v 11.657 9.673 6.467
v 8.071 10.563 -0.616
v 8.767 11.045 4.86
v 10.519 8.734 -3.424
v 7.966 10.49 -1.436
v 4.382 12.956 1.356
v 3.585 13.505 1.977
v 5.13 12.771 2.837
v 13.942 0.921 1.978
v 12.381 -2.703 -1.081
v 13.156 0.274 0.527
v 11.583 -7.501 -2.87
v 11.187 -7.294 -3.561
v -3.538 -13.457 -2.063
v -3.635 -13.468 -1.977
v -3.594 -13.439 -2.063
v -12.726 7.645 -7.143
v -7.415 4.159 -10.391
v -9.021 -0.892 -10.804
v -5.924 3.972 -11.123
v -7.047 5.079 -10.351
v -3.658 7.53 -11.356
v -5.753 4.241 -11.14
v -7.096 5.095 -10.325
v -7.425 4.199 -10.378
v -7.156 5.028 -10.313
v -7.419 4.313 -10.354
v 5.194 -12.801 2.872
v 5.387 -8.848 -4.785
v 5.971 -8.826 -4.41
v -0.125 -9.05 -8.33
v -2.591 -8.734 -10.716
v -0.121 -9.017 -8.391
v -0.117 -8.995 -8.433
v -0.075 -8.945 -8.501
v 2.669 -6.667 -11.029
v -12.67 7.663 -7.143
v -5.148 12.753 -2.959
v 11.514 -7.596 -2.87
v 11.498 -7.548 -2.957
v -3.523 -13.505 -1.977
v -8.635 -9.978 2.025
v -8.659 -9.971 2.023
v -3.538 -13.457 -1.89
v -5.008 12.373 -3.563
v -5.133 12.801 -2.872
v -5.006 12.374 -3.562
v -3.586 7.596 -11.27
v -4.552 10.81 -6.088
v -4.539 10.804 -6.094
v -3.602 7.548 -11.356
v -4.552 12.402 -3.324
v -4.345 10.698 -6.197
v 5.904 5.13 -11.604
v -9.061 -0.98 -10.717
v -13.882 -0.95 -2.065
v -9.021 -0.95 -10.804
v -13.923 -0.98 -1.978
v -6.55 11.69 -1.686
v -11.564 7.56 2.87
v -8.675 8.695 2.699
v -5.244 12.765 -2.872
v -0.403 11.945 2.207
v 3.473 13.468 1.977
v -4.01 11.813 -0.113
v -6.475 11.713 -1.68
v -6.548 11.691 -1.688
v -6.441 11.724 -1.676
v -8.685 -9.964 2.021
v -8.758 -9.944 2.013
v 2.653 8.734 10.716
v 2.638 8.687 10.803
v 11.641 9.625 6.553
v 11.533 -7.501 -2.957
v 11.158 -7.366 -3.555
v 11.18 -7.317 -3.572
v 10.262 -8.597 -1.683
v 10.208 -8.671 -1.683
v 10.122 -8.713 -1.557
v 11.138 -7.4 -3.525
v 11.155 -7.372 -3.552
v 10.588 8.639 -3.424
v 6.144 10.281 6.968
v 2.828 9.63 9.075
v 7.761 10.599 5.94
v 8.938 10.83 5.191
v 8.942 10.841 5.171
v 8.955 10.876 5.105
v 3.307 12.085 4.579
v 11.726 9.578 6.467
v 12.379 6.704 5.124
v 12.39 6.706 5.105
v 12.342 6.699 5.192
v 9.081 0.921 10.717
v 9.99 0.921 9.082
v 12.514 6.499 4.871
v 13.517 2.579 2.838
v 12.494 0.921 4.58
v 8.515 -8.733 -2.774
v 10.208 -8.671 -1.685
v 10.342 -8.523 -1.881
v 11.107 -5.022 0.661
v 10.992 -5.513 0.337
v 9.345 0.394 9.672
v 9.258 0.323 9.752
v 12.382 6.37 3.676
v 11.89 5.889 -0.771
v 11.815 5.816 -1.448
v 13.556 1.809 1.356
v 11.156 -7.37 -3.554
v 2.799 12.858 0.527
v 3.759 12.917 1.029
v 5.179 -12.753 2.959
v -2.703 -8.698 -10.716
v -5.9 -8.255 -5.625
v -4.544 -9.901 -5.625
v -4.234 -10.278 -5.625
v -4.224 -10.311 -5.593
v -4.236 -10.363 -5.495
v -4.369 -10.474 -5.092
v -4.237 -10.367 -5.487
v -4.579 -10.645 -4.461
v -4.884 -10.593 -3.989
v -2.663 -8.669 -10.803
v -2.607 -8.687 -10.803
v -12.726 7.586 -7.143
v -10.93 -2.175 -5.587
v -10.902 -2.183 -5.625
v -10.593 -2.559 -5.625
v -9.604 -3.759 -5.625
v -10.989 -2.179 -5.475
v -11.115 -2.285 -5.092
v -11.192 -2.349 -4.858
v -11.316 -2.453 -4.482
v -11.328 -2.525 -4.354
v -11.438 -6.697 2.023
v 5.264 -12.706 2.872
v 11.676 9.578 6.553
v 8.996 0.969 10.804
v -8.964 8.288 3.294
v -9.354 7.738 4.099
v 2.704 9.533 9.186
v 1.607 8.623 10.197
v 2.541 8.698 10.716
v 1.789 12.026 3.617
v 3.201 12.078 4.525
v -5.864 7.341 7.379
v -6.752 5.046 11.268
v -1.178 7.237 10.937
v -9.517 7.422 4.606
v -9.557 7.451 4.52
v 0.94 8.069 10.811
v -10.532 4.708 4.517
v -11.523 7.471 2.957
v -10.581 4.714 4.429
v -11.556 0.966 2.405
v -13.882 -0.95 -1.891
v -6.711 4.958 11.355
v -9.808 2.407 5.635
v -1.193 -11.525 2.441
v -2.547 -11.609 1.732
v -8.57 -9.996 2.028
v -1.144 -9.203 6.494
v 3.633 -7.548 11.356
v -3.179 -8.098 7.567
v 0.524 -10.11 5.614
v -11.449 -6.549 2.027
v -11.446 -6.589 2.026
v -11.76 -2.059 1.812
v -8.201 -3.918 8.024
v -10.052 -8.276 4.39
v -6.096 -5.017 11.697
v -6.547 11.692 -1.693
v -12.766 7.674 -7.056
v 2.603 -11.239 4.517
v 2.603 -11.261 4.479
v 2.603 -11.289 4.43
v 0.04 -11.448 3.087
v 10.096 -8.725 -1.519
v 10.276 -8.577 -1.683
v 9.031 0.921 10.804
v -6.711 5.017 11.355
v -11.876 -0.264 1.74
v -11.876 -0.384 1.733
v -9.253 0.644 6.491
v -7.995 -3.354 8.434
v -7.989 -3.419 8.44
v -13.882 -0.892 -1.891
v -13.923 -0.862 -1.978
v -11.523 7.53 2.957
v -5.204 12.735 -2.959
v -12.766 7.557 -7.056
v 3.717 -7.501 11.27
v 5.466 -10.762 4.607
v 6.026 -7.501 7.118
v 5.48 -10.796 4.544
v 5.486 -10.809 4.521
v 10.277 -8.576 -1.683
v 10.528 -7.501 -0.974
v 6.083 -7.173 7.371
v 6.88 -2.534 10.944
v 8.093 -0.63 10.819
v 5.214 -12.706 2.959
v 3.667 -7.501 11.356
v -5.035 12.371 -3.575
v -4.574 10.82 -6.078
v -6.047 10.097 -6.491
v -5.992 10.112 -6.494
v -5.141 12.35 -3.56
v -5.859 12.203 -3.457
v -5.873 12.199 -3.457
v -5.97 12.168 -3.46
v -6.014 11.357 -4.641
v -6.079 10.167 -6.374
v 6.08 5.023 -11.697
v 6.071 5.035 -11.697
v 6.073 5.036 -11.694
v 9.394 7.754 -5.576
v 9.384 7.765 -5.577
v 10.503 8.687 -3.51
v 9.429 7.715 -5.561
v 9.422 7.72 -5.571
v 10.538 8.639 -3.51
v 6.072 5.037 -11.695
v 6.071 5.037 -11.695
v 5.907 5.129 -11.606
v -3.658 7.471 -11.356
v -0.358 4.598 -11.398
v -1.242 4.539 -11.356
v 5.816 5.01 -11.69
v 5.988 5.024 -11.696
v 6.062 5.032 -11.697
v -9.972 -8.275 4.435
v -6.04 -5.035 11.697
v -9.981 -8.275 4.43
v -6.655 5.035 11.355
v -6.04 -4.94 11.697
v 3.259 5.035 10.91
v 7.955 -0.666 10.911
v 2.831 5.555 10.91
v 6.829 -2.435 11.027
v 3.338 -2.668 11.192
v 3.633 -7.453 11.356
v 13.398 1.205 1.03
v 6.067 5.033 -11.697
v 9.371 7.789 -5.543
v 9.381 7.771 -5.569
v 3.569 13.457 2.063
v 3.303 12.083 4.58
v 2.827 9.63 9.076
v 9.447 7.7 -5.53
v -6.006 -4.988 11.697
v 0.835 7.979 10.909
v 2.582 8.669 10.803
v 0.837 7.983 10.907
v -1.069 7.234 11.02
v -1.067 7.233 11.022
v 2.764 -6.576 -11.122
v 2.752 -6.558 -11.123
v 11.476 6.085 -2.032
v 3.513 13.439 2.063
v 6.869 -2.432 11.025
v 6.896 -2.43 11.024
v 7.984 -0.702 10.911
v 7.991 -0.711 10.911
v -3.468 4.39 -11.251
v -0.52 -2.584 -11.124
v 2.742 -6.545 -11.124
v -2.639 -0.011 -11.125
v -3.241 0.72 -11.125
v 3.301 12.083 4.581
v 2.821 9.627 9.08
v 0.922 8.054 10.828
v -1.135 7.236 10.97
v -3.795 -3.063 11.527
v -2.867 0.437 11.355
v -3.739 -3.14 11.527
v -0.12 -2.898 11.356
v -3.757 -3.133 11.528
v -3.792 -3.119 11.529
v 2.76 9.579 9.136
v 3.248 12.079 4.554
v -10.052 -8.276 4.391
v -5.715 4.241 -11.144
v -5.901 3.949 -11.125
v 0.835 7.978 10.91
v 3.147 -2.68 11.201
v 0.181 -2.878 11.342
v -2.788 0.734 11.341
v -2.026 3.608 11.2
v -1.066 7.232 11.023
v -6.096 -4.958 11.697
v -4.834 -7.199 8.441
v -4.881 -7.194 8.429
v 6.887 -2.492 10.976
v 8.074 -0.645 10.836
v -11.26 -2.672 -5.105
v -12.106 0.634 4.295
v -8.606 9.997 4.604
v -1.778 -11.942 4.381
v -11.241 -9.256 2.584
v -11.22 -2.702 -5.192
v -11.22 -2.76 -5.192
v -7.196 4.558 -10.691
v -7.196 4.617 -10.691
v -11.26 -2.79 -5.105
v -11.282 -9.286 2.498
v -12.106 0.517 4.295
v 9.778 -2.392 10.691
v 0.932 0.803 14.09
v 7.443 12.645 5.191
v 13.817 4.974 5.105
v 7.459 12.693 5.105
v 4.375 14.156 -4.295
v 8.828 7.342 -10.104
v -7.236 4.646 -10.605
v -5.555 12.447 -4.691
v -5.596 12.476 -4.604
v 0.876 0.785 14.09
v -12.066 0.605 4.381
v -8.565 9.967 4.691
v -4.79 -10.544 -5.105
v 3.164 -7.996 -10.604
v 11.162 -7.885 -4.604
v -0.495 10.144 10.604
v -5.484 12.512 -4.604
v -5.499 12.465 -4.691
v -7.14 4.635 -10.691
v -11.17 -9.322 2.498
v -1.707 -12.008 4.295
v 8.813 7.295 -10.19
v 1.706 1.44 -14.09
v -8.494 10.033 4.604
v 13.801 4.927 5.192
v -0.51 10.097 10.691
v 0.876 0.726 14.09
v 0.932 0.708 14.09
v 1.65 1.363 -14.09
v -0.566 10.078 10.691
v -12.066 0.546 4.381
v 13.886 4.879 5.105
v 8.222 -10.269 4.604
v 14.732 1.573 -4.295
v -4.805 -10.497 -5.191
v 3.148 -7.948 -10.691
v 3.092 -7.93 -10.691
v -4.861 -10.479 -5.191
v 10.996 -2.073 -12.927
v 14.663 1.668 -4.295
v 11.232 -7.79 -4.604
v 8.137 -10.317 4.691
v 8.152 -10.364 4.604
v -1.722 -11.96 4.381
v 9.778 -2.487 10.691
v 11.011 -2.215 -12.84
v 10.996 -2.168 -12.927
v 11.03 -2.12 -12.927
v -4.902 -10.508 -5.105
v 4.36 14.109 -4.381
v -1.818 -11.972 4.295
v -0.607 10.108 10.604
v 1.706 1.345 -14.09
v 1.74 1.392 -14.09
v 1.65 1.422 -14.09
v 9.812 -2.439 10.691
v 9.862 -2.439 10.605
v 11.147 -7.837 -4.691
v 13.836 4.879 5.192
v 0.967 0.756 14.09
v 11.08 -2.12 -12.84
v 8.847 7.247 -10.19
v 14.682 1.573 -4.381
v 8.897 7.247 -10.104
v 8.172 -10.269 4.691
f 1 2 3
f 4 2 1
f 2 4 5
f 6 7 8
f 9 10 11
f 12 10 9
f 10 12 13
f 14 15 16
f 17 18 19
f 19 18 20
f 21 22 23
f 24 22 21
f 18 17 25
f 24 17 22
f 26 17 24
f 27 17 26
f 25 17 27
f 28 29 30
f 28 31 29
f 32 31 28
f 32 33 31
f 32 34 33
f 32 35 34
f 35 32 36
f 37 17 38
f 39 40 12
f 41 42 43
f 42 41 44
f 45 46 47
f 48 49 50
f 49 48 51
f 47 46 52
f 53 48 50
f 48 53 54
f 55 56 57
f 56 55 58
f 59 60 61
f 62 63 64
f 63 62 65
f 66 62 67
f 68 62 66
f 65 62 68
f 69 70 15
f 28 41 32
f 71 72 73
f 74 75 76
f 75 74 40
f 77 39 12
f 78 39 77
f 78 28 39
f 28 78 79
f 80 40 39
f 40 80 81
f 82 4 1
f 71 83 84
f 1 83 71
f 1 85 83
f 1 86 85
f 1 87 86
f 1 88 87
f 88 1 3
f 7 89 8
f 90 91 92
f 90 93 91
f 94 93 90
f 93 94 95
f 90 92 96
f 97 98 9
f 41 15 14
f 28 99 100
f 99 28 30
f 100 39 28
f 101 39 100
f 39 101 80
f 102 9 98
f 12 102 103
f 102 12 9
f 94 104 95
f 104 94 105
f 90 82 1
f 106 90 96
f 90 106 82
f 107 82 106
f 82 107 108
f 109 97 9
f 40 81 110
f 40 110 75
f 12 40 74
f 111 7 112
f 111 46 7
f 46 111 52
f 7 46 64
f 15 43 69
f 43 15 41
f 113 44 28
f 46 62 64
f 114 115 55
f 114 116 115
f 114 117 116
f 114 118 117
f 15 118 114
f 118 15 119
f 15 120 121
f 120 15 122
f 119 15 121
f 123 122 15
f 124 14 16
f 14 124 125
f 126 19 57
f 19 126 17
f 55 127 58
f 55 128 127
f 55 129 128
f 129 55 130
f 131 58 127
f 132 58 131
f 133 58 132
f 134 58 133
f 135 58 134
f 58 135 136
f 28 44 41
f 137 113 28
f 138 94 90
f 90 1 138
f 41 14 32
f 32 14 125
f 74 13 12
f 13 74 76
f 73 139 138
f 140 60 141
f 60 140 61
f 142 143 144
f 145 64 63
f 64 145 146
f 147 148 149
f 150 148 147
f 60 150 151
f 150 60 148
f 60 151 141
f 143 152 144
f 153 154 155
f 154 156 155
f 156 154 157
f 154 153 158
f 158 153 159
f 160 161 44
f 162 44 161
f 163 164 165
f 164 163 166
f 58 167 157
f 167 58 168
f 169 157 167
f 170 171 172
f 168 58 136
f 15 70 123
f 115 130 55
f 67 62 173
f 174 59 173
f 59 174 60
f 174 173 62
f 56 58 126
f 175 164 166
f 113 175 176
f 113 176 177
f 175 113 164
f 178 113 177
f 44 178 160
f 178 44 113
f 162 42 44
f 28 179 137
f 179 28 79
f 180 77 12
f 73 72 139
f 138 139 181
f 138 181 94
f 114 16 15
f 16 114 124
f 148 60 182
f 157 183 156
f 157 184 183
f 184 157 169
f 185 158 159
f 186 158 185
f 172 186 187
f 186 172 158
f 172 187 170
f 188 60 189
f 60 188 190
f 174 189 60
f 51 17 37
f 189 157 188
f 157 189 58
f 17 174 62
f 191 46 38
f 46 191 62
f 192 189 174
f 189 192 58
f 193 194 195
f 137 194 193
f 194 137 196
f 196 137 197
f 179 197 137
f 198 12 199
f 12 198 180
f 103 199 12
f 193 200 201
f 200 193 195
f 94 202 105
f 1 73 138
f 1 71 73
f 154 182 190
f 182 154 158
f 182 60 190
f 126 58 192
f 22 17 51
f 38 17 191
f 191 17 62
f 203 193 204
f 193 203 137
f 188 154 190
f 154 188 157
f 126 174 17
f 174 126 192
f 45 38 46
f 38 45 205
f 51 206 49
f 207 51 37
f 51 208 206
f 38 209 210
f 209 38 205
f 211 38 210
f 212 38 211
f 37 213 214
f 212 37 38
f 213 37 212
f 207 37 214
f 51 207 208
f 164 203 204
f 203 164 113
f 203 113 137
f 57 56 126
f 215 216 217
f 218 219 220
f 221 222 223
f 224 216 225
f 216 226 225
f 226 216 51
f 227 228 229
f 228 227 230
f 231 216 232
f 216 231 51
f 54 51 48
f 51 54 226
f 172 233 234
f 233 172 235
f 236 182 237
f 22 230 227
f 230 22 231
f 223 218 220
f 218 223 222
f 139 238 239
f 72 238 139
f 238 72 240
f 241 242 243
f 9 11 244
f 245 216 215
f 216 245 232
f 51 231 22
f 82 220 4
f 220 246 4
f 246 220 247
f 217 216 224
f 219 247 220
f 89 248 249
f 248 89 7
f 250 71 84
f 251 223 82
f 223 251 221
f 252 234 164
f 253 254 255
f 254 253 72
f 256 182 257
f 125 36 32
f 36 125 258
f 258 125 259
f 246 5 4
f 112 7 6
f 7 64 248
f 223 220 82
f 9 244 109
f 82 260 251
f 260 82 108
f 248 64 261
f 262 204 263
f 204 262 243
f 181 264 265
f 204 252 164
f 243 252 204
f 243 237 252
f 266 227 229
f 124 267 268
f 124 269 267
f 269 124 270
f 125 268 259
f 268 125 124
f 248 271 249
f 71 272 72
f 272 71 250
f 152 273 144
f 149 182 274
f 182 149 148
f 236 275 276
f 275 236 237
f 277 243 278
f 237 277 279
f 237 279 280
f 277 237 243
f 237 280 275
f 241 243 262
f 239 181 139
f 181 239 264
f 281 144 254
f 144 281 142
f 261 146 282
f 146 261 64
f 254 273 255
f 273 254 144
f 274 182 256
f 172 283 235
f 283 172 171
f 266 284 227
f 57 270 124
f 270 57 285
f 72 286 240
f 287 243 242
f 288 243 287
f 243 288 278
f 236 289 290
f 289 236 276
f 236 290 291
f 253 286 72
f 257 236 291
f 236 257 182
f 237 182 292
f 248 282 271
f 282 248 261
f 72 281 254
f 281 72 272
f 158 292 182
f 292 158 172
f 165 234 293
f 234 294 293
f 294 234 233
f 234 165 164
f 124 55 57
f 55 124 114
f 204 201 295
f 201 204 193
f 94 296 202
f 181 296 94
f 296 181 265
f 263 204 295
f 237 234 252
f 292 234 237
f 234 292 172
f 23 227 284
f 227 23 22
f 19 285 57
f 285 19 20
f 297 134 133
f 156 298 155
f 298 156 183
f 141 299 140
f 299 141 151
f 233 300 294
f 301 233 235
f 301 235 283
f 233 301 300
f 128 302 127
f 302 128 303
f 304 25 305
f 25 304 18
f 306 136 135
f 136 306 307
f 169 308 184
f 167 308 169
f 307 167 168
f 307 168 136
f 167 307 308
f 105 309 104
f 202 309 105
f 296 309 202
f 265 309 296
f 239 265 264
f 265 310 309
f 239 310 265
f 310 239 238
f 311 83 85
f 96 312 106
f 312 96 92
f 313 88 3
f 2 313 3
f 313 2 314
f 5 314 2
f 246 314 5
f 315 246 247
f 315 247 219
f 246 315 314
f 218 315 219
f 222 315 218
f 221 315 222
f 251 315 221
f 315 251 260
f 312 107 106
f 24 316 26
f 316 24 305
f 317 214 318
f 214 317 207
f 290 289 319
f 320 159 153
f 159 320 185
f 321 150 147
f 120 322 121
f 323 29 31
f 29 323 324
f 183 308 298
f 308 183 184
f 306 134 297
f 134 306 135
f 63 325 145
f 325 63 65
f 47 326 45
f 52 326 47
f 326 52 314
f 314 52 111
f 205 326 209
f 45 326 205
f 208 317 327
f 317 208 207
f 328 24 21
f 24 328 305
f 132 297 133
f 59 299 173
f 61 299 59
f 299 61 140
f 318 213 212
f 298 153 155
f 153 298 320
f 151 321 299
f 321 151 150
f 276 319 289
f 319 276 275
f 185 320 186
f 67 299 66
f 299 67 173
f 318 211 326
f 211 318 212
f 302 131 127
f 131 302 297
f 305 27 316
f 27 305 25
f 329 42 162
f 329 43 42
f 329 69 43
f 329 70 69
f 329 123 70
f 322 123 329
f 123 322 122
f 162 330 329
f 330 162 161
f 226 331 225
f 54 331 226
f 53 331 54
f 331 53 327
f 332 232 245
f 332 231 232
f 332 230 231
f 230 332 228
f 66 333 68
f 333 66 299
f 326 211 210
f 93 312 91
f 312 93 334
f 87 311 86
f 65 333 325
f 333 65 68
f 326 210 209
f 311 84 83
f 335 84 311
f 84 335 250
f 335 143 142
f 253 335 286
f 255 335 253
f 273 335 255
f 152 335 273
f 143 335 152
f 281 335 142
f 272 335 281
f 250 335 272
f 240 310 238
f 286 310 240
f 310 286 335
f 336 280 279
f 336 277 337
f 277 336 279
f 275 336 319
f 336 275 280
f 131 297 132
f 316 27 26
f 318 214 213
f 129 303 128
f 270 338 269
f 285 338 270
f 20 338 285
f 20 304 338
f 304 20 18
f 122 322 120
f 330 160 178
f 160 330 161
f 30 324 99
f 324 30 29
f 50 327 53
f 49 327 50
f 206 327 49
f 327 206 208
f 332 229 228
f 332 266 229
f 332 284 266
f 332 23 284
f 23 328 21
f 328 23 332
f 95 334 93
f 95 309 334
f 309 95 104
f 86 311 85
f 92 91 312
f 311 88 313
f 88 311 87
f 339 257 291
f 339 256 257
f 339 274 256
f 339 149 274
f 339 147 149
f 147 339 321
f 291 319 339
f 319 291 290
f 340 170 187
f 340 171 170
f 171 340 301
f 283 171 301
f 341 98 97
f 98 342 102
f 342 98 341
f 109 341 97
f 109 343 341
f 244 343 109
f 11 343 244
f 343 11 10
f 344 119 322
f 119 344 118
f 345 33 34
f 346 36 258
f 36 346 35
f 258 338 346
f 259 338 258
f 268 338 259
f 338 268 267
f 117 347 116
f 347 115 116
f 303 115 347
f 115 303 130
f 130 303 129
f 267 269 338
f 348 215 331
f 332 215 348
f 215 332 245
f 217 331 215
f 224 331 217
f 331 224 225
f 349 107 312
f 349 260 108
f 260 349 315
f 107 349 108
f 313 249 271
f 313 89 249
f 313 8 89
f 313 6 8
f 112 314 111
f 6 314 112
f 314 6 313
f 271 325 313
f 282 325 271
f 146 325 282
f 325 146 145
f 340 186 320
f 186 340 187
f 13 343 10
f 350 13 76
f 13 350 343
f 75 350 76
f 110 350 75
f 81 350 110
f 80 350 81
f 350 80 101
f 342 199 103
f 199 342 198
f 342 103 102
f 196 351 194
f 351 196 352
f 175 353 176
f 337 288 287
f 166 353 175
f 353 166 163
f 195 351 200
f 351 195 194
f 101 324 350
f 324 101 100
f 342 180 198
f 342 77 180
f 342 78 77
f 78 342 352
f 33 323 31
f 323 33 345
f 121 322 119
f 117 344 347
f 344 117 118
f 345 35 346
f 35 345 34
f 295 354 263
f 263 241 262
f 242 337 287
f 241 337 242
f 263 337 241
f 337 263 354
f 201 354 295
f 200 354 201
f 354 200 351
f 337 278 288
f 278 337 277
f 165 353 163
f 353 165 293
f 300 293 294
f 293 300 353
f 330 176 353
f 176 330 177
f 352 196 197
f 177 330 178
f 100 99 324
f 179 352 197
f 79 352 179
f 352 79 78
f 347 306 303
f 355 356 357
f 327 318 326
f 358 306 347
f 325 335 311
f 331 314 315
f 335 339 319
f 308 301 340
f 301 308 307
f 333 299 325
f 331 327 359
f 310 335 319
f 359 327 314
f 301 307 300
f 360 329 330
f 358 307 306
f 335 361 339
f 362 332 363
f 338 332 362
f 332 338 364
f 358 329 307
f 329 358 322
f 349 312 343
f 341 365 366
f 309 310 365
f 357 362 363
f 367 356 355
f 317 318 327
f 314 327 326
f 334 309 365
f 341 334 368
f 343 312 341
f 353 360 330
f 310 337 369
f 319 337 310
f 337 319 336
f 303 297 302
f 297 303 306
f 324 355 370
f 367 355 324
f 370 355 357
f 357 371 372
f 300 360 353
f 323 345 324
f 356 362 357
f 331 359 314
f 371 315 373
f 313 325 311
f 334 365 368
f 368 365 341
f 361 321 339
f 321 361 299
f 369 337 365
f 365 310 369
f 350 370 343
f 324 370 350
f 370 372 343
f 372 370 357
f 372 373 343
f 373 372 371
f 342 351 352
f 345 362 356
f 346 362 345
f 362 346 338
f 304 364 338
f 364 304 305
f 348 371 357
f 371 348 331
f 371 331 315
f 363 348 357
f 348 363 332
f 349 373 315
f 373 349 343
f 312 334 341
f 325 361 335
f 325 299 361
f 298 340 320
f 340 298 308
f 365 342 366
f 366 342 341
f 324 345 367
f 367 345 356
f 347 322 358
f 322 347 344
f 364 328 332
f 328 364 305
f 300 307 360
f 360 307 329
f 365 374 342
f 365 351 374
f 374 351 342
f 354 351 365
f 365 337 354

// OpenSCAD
// Auto-generated OpenSCAD file

    inner_points = 10*[[-0.4820813211250987, -1.0449238650604131, -0.5104799034334353], [-0.052587296473702555, 1.0049095944004596, 1.060449642253799], [0.3132765628671369, -0.7900923074517557, -1.060449642253799], [0.7427705875185331, 1.259741152009117, 0.5104799034334353], [0.8121529711437319, -1.026904669604844, 0.4604304395233323], [0.9762050905955799, -0.24393795936757026, 1.060472132044425], [-0.7155158242021455, 0.4587552463162742, -1.060472132044425], [-0.5514637047502975, 1.241721956553548, -0.4604304395233323], [-0.6190335754244582, -0.5099059922176972, 1.010386278888689], [1.4632403980874105, 0.15725168700784506, -0.4294531901269253], [-1.2025511316939763, 0.05756559994085883, 0.4294531901269253], [0.8797228418178926, 0.7247232791664011, -1.010386278888689], [-0.1737587446246939, -1.191281953827171, 0.4294756799175514], [0.09168316057485429, 0.07558479539642826, 1.400363533083693], [1.1131573448949394, -0.7789558322102864, -0.4603940502776995], [1.3785992500944875, 0.487910917013313, 0.5104938028884421], [-1.1179099837010533, -0.27309363006460907, -0.5104938028884421], [-0.8524680785015052, 0.9937731191589904, 0.4603940502776995], [0.16900610581858003, 0.13923249155227563, -1.400363533083693], [0.43444801101812824, 1.406099240775875, -0.4294756799175514], [-1.1201047009544618, -0.9226987816684733, 0.249774787956858], [1.0980326190753988, -0.212010675559726, -1.284010728119616]];

    outer_points = 10*[[0.3553738060072703, 1.340954088422547, 0.19767924096673445], [0.5163570327909294, -1.270590953937949, 0.28722732116012484], [-0.5163570327909294, 1.270590953937949, -0.28722732116012484], [-0.3553738060072703, -1.340954088422547, -0.19767924096673445], [-0.6670731664763409, 0.4987607215152127, 1.1268436558827821], [-0.6055830454636154, -0.4987607215152127, 1.161047978889356], [0.6055830454636154, 0.4987607215152127, -1.161047978889356], [0.6670731664763409, -0.4987607215152127, -1.1268436558827821], [0.8980547740238846, 0.09210653881782889, 1.071699351461188], [-1.3841661909912581, -0.09210653881782889, -0.19780250955479217], [1.3841661909912581, 0.09210653881782889, 0.19780250955479217], [-0.8980547740238846, -0.09210653881782889, -1.071699351461188], [0.26222611273671315, 0.863936771240565, 1.0716231672840233], [0.36171921850764677, -0.7500868280895054, 1.1269669244708398], [-1.1482640134802296, 0.7500868280895054, 0.28702786839490235], [-1.048770907709296, -0.863936771240565, 0.34237162558171885], [1.048770907709296, 0.863936771240565, -0.34237162558171885], [1.1482640134802296, -0.7500868280895054, -0.28702786839490235], [-0.36171921850764677, 0.7500868280895054, -1.1269669244708398], [-0.26222611273671315, -0.863936771240565, -1.0716231672840233], [1.162572789567373, 0.9577836380236123, 0.6466894935006993], [-1.2685575801393754, 0.7615511020849973, -0.7056442971472661]];

    // Convex hull for inner set (I)
    module inner_hull() {
        hull() {
            for (p = inner_points) {
                translate(p) sphere(r=0.1);
            }
        }
    }

    // Convex hull for outer set (O) minus inner hull (O \ I)
    module outer_minus_inner() {
        difference() {
            hull() {
                for (p = outer_points) {
                    translate(p) sphere(r=0.1);
                }
            }
            inner_hull(); // Subtract inner hull
        }
    }

    // Convex hull for outer set (O) minus all translated inner hulls
    module outer_minus_AllTranslationInner() {
        difference() {
            hull() {
                for (p = outer_points) {
                    translate(p) sphere(r=0.1);
                }
            }
            hull() {
                translate([0,0,50]) inner_hull();
                translate([0,0,-50]) inner_hull();
            }; // Subtract translated inner hulls
        }
    }

    // Difference between outer_minus_inner and outer_minus_AllTranslationInner
    module outer_minus_inner_diff() {
        difference() {
            // Outer minus inner
            difference() {
                hull() {
                    for (p = outer_points) {
                        translate(p) sphere(r=0.1);
                    }
                }
                inner_hull();
            }

            // Subtract Outer minus AllTranslationInner
            difference() {
                hull() {
                    for (p = outer_points) {
                        translate(p) sphere(r=0.1);
                    }
                }
                hull() {
                    translate([0,0,50]) inner_hull();
                    translate([0,0,-50]) inner_hull();
                };
            }
        }
    }

    // Rendering all with colors applied
    color([1, 0, 0, 0.5]) inner_hull(); // Transparent red
    color([0, 1, 0, 1]) outer_minus_AllTranslationInner(); // Opaque green
    color([1, 1, 0, 1]) outer_minus_inner_diff(); // Opaque yellow
    
